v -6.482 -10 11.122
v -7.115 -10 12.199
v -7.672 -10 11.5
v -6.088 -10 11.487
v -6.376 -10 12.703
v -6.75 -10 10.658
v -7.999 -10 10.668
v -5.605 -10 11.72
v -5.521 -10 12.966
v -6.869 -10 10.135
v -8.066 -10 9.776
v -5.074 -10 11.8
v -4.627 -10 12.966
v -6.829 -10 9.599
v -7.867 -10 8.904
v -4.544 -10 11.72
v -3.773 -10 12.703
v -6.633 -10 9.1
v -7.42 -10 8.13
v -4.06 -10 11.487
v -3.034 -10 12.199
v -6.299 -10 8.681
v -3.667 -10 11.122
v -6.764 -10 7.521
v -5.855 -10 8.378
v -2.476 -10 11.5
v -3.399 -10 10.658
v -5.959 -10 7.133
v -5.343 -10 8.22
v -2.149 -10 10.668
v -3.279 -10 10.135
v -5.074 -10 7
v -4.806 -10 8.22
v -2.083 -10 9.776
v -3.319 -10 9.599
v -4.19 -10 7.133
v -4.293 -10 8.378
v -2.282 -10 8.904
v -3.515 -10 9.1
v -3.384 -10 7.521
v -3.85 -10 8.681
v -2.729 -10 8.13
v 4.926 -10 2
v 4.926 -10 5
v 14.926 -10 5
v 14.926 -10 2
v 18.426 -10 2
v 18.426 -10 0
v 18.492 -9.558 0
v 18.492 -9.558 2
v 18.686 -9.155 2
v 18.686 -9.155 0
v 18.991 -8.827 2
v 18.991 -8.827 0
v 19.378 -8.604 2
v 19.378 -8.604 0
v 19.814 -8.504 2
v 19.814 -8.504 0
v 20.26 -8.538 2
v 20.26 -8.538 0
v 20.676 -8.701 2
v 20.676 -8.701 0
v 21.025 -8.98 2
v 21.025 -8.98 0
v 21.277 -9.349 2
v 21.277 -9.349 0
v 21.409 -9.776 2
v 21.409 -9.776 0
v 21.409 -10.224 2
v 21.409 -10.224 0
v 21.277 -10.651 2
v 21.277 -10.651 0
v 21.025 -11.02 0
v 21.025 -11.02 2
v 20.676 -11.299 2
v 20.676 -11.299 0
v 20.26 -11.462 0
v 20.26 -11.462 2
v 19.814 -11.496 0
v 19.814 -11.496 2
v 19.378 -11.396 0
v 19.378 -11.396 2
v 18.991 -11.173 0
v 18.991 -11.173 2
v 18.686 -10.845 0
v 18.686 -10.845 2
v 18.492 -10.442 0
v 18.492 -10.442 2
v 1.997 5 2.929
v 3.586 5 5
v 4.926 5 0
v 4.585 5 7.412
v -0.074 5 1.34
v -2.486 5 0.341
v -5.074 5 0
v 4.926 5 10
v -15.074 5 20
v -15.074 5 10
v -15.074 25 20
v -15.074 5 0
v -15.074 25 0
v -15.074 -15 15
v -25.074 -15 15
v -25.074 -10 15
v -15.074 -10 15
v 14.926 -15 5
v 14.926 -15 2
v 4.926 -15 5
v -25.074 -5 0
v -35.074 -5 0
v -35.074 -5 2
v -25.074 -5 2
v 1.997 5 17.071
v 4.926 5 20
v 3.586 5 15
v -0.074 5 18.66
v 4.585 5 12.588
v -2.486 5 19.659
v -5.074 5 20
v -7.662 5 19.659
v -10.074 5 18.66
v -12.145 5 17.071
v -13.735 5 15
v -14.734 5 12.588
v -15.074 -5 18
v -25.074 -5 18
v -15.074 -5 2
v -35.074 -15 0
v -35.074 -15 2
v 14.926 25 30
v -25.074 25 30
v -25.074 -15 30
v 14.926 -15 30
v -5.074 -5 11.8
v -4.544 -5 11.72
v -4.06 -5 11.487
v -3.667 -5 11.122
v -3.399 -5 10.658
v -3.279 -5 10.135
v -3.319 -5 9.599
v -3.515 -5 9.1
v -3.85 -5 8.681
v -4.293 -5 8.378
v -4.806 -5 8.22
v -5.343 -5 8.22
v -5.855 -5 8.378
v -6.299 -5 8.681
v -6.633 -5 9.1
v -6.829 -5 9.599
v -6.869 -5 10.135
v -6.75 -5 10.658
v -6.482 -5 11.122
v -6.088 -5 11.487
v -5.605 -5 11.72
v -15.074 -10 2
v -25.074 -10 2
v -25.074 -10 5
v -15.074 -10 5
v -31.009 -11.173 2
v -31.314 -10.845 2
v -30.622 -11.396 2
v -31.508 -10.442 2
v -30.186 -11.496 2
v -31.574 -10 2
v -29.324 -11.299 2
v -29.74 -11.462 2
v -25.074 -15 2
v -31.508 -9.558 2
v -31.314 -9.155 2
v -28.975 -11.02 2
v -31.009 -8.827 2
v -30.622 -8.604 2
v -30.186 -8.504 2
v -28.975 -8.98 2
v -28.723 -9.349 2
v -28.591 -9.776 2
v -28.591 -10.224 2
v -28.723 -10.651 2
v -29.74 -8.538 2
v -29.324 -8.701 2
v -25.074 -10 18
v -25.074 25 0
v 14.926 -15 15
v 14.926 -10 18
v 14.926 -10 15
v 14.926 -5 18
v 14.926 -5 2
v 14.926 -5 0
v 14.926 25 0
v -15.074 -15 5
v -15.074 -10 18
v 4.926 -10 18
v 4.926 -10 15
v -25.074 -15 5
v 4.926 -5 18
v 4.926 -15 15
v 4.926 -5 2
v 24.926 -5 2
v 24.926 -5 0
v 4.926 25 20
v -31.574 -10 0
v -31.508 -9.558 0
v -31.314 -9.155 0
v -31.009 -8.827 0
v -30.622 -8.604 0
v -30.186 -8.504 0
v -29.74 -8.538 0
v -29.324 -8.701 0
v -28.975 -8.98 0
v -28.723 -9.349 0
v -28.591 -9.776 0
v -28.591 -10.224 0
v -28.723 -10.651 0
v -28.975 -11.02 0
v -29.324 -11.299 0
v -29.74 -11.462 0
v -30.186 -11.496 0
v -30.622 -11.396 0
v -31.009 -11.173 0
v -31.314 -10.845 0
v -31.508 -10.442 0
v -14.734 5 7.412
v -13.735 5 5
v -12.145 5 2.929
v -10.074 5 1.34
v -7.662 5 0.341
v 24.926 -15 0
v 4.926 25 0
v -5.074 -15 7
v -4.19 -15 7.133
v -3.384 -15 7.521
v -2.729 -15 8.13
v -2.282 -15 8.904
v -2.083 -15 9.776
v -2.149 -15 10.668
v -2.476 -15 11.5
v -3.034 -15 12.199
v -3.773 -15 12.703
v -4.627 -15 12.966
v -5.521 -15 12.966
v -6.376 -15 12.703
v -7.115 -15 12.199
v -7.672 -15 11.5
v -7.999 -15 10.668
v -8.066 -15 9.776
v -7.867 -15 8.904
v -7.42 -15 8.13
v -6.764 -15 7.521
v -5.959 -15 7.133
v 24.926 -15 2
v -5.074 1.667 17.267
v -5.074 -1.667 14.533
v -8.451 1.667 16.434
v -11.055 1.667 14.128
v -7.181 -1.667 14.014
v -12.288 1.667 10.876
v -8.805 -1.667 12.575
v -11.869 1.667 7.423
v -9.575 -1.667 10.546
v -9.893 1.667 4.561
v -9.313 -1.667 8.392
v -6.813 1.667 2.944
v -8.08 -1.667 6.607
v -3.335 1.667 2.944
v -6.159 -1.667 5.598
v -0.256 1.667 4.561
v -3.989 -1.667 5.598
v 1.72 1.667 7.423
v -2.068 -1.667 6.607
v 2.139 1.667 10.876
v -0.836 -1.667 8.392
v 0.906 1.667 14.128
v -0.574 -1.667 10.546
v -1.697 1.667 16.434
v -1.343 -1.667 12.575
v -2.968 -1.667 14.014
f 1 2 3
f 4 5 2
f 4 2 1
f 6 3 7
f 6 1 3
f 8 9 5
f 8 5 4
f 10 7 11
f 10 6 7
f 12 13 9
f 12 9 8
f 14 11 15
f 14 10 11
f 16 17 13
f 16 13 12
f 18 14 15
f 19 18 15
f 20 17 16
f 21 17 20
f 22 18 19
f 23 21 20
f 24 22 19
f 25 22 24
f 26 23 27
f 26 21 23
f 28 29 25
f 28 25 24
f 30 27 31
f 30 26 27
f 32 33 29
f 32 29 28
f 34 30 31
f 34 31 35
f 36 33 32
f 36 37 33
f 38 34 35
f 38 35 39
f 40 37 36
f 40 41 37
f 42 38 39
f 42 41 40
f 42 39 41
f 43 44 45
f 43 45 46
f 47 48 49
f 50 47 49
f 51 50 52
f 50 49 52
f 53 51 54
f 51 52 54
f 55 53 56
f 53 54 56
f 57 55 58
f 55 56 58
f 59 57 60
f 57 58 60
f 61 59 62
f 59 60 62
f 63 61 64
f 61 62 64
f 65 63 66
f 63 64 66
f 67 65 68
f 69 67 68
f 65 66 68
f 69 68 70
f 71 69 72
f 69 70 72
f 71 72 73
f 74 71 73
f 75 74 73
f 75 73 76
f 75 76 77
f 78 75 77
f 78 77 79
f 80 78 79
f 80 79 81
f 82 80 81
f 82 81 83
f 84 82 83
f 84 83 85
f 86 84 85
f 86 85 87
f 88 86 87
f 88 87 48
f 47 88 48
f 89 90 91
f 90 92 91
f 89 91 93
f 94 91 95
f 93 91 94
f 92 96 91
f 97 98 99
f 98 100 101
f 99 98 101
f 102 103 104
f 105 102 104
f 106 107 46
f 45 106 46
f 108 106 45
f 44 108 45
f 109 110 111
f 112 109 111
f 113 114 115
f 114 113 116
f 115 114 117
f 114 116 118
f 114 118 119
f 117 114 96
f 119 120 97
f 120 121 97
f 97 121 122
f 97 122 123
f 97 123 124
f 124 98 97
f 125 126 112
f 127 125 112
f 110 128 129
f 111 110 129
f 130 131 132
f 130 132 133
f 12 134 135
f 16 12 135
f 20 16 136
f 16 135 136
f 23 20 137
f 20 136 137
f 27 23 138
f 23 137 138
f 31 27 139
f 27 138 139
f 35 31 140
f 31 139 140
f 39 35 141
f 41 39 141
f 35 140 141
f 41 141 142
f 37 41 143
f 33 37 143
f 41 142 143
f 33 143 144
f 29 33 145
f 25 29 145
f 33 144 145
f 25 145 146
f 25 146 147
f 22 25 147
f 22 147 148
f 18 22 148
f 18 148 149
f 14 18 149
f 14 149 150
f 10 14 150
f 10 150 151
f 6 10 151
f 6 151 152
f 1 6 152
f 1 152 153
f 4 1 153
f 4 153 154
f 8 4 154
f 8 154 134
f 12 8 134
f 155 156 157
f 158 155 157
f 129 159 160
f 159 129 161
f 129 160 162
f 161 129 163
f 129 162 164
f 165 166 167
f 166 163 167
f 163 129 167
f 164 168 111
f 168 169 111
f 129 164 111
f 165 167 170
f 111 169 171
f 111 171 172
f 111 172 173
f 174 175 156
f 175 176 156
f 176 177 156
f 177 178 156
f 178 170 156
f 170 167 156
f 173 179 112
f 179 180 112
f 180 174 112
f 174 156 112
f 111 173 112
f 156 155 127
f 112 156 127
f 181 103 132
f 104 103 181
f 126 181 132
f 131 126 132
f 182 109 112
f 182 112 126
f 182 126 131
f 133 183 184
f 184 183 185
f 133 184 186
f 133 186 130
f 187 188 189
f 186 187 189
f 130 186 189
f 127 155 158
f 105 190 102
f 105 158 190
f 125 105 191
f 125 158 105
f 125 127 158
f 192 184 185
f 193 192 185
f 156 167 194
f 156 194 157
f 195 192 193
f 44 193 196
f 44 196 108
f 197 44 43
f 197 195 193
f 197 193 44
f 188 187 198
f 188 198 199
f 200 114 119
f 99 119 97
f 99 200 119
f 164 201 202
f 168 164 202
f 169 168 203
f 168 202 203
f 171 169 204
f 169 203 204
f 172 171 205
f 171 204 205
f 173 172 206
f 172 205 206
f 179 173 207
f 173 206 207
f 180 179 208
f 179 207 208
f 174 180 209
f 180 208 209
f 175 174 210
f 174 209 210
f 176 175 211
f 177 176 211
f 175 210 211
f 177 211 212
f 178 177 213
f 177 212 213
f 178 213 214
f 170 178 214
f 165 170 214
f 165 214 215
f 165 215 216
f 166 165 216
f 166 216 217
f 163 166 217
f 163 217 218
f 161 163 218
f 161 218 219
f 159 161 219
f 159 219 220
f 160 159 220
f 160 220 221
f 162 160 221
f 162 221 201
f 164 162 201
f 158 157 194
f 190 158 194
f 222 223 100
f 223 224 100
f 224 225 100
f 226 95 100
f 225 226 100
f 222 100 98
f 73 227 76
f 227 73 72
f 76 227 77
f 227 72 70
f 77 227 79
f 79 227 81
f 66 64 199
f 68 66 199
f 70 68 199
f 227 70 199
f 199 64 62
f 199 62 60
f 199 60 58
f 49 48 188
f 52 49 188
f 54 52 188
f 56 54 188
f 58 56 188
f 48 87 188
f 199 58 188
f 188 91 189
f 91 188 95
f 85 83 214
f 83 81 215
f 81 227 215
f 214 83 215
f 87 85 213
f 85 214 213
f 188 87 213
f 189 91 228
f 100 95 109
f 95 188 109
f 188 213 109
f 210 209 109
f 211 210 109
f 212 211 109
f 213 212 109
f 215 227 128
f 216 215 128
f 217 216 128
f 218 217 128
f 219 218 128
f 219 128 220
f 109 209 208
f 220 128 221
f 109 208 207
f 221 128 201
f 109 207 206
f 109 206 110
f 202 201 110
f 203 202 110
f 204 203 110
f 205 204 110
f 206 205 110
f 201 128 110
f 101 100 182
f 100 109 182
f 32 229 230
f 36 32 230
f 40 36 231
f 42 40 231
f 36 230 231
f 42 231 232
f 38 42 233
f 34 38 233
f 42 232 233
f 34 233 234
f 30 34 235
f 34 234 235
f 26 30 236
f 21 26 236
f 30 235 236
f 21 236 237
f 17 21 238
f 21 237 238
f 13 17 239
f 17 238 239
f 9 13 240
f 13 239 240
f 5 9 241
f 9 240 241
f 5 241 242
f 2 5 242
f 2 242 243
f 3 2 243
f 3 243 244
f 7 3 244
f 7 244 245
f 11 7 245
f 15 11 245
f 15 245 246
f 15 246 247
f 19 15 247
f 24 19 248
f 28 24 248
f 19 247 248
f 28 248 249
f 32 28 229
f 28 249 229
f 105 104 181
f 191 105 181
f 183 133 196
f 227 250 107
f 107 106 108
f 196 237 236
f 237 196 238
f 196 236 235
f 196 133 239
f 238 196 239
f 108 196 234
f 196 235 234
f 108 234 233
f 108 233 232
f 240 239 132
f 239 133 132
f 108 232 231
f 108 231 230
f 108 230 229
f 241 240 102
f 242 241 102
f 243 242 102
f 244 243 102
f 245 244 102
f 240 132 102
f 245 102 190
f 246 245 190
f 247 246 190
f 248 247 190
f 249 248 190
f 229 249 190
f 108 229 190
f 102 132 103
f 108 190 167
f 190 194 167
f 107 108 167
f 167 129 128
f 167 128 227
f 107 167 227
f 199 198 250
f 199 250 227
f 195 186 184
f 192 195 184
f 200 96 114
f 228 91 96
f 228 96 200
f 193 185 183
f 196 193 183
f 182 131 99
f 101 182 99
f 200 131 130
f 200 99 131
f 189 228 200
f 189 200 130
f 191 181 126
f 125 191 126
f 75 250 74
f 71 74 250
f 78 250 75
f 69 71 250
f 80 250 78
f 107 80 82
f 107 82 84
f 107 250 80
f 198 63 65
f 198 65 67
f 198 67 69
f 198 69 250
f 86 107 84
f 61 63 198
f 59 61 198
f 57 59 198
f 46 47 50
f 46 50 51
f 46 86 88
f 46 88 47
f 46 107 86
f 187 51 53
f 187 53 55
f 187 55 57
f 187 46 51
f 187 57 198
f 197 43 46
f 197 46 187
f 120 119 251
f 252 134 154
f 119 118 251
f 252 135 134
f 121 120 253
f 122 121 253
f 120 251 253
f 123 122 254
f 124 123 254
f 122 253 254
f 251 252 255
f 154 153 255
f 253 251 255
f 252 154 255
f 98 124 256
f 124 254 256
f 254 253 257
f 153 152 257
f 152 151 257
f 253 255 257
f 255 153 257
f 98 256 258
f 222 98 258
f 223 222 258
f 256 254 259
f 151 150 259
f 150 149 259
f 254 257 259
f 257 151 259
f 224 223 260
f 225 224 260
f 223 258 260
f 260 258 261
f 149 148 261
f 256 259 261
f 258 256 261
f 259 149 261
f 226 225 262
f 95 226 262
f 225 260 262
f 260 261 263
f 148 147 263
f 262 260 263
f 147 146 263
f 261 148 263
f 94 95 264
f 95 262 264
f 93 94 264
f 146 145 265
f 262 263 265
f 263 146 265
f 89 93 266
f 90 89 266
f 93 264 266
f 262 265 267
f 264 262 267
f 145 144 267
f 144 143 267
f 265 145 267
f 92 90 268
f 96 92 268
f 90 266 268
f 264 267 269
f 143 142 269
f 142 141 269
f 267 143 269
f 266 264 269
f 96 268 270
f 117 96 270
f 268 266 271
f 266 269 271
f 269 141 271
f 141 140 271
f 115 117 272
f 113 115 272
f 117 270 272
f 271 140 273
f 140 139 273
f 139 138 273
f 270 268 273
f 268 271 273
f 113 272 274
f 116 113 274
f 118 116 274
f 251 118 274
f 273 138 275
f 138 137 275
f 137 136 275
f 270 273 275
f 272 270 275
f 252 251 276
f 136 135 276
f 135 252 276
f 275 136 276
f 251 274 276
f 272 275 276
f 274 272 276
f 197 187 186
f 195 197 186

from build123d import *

# Parameters (mm, degrees)
SKETCH1_W           = 40
SKETCH1_H           = 40
BOSS_EXTRUDE1_DEPTH = 30
SKETCH2_W           = 20
SKETCH2_H           = 20
CUT_EXTRUDE1_DEPTH  = 20
SKETCH5_R           = 1.8
CUT_EXTRUDE6_DEPTH  = 20
SKETCH25_W          = 2
SKETCH25_H          = 10
BOSS_EXTRUDE2_DEPTH = 10
SKETCH26_W          = 2
SKETCH26_H          = 10
BOSS_EXTRUDE3_DEPTH = 10
SKETCH27_R          = 1.5
CUT_EXTRUDE7_DEPTH  = 10
CUT_EXTRUDE8_DEPTH  = 10
CUT_EXTRUDE9_DEPTH  = 10
SKETCH30_R          = 3
CUT_EXTRUDE10_DEPTH = 5


with BuildPart() as part:
    # Sketch1 → Boss-Extrude1 (new body)
    with BuildSketch(Plane.XY):
        with Locations((-5.074257426, 5)):
            Rectangle(SKETCH1_W, SKETCH1_H)
    extrude(amount=BOSS_EXTRUDE1_DEPTH)

    # Sketch2 → Cut-Extrude1 (cut)
    with BuildSketch(Plane(origin=(0, 0, 0), x_dir=(-1, 0, 0), z_dir=(0, 0, -1))):
        with Locations((5.074257426, 15)):
            Rectangle(SKETCH2_W, SKETCH2_H)
    extrude(amount=-CUT_EXTRUDE1_DEPTH, mode=Mode.SUBTRACT)

    # Sketch5 → Cut-Extrude6 (cut)
    with BuildSketch(Plane(origin=(0, 5, 0), x_dir=(1, 0, 0), z_dir=(0, 1, 0))):
        with Locations(Location((-5.074257426, -10, 0), (0, 0, 270))):
            Circle(SKETCH5_R)
    extrude(amount=-CUT_EXTRUDE6_DEPTH, mode=Mode.SUBTRACT)

    # Sketch24 → Cut-Revolve1 (revolve, cut)
    with BuildSketch(Plane.XY.offset(10), mode=Mode.PRIVATE) as cut_revolve1_sk:
        Polygon((-3.274257426, -5), (-5.074257426, -5), (-5.074257426, 5), (4.925742574, 5), align=None)
    revolve(cut_revolve1_sk.sketch.rotate(Axis((-5.074257426, 5, 10), (0, -1, 0)), 90), axis=Axis((-5.074257426, 5, 10), (0, -1, 0)), mode=Mode.SUBTRACT)

    # Sketch25 → Boss-Extrude2 (add)
    with BuildSketch(Plane.ZY.offset(25.074257426)):
        with Locations((1, -10)):
            Rectangle(SKETCH25_W, SKETCH25_H)
    extrude(amount=BOSS_EXTRUDE2_DEPTH)

    # Sketch26 → Boss-Extrude3 (add)
    with BuildSketch(Plane(origin=(14.925742574, 0, 0), x_dir=(0, 0, -1), z_dir=(1, 0, 0))):
        with Locations((-1, -10)):
            Rectangle(SKETCH26_W, SKETCH26_H)
    extrude(amount=BOSS_EXTRUDE3_DEPTH)

    # Sketch27 → Cut-Extrude7 (cut)
    with BuildSketch(Plane(origin=(0, 0, 0), x_dir=(-1, 0, 0), z_dir=(0, 0, -1))):
        with Locations((-19.925742574, -10)):
            Circle(SKETCH27_R)
        with Locations((30.074257426, -10)):
            Circle(SKETCH27_R)
    extrude(amount=-CUT_EXTRUDE7_DEPTH, mode=Mode.SUBTRACT)

    # Sketch28 → Cut-Extrude8 (cut)
    with BuildSketch(Plane(origin=(14.925742574, 0, 0), x_dir=(0, 0, -1), z_dir=(1, 0, 0))):
        Polygon((-15, -10), (-15, -15), (-5, -15), (-5, -10), (-2, -10), (-2, -5), (-18, -5), (-18, -10), align=None)
    extrude(amount=-CUT_EXTRUDE8_DEPTH, mode=Mode.SUBTRACT)

    # Sketch29 → Cut-Extrude9 (cut)
    with BuildSketch(Plane.ZY.offset(25.074257426)):
        Polygon((5, -15), (15, -15), (15, -10), (18, -10), (18, -5), (2, -5), (2, -10), (5, -10), align=None)
    extrude(amount=-CUT_EXTRUDE9_DEPTH, mode=Mode.SUBTRACT)

    # Sketch30 → Cut-Extrude10 (cut)
    with BuildSketch(Plane.XZ.offset(15)):
        with Locations(Location((-5.074257426, 10, 0), (0, 0, 270))):
            Circle(SKETCH30_R)
    extrude(amount=-CUT_EXTRUDE10_DEPTH, mode=Mode.SUBTRACT)


solid = part.part
